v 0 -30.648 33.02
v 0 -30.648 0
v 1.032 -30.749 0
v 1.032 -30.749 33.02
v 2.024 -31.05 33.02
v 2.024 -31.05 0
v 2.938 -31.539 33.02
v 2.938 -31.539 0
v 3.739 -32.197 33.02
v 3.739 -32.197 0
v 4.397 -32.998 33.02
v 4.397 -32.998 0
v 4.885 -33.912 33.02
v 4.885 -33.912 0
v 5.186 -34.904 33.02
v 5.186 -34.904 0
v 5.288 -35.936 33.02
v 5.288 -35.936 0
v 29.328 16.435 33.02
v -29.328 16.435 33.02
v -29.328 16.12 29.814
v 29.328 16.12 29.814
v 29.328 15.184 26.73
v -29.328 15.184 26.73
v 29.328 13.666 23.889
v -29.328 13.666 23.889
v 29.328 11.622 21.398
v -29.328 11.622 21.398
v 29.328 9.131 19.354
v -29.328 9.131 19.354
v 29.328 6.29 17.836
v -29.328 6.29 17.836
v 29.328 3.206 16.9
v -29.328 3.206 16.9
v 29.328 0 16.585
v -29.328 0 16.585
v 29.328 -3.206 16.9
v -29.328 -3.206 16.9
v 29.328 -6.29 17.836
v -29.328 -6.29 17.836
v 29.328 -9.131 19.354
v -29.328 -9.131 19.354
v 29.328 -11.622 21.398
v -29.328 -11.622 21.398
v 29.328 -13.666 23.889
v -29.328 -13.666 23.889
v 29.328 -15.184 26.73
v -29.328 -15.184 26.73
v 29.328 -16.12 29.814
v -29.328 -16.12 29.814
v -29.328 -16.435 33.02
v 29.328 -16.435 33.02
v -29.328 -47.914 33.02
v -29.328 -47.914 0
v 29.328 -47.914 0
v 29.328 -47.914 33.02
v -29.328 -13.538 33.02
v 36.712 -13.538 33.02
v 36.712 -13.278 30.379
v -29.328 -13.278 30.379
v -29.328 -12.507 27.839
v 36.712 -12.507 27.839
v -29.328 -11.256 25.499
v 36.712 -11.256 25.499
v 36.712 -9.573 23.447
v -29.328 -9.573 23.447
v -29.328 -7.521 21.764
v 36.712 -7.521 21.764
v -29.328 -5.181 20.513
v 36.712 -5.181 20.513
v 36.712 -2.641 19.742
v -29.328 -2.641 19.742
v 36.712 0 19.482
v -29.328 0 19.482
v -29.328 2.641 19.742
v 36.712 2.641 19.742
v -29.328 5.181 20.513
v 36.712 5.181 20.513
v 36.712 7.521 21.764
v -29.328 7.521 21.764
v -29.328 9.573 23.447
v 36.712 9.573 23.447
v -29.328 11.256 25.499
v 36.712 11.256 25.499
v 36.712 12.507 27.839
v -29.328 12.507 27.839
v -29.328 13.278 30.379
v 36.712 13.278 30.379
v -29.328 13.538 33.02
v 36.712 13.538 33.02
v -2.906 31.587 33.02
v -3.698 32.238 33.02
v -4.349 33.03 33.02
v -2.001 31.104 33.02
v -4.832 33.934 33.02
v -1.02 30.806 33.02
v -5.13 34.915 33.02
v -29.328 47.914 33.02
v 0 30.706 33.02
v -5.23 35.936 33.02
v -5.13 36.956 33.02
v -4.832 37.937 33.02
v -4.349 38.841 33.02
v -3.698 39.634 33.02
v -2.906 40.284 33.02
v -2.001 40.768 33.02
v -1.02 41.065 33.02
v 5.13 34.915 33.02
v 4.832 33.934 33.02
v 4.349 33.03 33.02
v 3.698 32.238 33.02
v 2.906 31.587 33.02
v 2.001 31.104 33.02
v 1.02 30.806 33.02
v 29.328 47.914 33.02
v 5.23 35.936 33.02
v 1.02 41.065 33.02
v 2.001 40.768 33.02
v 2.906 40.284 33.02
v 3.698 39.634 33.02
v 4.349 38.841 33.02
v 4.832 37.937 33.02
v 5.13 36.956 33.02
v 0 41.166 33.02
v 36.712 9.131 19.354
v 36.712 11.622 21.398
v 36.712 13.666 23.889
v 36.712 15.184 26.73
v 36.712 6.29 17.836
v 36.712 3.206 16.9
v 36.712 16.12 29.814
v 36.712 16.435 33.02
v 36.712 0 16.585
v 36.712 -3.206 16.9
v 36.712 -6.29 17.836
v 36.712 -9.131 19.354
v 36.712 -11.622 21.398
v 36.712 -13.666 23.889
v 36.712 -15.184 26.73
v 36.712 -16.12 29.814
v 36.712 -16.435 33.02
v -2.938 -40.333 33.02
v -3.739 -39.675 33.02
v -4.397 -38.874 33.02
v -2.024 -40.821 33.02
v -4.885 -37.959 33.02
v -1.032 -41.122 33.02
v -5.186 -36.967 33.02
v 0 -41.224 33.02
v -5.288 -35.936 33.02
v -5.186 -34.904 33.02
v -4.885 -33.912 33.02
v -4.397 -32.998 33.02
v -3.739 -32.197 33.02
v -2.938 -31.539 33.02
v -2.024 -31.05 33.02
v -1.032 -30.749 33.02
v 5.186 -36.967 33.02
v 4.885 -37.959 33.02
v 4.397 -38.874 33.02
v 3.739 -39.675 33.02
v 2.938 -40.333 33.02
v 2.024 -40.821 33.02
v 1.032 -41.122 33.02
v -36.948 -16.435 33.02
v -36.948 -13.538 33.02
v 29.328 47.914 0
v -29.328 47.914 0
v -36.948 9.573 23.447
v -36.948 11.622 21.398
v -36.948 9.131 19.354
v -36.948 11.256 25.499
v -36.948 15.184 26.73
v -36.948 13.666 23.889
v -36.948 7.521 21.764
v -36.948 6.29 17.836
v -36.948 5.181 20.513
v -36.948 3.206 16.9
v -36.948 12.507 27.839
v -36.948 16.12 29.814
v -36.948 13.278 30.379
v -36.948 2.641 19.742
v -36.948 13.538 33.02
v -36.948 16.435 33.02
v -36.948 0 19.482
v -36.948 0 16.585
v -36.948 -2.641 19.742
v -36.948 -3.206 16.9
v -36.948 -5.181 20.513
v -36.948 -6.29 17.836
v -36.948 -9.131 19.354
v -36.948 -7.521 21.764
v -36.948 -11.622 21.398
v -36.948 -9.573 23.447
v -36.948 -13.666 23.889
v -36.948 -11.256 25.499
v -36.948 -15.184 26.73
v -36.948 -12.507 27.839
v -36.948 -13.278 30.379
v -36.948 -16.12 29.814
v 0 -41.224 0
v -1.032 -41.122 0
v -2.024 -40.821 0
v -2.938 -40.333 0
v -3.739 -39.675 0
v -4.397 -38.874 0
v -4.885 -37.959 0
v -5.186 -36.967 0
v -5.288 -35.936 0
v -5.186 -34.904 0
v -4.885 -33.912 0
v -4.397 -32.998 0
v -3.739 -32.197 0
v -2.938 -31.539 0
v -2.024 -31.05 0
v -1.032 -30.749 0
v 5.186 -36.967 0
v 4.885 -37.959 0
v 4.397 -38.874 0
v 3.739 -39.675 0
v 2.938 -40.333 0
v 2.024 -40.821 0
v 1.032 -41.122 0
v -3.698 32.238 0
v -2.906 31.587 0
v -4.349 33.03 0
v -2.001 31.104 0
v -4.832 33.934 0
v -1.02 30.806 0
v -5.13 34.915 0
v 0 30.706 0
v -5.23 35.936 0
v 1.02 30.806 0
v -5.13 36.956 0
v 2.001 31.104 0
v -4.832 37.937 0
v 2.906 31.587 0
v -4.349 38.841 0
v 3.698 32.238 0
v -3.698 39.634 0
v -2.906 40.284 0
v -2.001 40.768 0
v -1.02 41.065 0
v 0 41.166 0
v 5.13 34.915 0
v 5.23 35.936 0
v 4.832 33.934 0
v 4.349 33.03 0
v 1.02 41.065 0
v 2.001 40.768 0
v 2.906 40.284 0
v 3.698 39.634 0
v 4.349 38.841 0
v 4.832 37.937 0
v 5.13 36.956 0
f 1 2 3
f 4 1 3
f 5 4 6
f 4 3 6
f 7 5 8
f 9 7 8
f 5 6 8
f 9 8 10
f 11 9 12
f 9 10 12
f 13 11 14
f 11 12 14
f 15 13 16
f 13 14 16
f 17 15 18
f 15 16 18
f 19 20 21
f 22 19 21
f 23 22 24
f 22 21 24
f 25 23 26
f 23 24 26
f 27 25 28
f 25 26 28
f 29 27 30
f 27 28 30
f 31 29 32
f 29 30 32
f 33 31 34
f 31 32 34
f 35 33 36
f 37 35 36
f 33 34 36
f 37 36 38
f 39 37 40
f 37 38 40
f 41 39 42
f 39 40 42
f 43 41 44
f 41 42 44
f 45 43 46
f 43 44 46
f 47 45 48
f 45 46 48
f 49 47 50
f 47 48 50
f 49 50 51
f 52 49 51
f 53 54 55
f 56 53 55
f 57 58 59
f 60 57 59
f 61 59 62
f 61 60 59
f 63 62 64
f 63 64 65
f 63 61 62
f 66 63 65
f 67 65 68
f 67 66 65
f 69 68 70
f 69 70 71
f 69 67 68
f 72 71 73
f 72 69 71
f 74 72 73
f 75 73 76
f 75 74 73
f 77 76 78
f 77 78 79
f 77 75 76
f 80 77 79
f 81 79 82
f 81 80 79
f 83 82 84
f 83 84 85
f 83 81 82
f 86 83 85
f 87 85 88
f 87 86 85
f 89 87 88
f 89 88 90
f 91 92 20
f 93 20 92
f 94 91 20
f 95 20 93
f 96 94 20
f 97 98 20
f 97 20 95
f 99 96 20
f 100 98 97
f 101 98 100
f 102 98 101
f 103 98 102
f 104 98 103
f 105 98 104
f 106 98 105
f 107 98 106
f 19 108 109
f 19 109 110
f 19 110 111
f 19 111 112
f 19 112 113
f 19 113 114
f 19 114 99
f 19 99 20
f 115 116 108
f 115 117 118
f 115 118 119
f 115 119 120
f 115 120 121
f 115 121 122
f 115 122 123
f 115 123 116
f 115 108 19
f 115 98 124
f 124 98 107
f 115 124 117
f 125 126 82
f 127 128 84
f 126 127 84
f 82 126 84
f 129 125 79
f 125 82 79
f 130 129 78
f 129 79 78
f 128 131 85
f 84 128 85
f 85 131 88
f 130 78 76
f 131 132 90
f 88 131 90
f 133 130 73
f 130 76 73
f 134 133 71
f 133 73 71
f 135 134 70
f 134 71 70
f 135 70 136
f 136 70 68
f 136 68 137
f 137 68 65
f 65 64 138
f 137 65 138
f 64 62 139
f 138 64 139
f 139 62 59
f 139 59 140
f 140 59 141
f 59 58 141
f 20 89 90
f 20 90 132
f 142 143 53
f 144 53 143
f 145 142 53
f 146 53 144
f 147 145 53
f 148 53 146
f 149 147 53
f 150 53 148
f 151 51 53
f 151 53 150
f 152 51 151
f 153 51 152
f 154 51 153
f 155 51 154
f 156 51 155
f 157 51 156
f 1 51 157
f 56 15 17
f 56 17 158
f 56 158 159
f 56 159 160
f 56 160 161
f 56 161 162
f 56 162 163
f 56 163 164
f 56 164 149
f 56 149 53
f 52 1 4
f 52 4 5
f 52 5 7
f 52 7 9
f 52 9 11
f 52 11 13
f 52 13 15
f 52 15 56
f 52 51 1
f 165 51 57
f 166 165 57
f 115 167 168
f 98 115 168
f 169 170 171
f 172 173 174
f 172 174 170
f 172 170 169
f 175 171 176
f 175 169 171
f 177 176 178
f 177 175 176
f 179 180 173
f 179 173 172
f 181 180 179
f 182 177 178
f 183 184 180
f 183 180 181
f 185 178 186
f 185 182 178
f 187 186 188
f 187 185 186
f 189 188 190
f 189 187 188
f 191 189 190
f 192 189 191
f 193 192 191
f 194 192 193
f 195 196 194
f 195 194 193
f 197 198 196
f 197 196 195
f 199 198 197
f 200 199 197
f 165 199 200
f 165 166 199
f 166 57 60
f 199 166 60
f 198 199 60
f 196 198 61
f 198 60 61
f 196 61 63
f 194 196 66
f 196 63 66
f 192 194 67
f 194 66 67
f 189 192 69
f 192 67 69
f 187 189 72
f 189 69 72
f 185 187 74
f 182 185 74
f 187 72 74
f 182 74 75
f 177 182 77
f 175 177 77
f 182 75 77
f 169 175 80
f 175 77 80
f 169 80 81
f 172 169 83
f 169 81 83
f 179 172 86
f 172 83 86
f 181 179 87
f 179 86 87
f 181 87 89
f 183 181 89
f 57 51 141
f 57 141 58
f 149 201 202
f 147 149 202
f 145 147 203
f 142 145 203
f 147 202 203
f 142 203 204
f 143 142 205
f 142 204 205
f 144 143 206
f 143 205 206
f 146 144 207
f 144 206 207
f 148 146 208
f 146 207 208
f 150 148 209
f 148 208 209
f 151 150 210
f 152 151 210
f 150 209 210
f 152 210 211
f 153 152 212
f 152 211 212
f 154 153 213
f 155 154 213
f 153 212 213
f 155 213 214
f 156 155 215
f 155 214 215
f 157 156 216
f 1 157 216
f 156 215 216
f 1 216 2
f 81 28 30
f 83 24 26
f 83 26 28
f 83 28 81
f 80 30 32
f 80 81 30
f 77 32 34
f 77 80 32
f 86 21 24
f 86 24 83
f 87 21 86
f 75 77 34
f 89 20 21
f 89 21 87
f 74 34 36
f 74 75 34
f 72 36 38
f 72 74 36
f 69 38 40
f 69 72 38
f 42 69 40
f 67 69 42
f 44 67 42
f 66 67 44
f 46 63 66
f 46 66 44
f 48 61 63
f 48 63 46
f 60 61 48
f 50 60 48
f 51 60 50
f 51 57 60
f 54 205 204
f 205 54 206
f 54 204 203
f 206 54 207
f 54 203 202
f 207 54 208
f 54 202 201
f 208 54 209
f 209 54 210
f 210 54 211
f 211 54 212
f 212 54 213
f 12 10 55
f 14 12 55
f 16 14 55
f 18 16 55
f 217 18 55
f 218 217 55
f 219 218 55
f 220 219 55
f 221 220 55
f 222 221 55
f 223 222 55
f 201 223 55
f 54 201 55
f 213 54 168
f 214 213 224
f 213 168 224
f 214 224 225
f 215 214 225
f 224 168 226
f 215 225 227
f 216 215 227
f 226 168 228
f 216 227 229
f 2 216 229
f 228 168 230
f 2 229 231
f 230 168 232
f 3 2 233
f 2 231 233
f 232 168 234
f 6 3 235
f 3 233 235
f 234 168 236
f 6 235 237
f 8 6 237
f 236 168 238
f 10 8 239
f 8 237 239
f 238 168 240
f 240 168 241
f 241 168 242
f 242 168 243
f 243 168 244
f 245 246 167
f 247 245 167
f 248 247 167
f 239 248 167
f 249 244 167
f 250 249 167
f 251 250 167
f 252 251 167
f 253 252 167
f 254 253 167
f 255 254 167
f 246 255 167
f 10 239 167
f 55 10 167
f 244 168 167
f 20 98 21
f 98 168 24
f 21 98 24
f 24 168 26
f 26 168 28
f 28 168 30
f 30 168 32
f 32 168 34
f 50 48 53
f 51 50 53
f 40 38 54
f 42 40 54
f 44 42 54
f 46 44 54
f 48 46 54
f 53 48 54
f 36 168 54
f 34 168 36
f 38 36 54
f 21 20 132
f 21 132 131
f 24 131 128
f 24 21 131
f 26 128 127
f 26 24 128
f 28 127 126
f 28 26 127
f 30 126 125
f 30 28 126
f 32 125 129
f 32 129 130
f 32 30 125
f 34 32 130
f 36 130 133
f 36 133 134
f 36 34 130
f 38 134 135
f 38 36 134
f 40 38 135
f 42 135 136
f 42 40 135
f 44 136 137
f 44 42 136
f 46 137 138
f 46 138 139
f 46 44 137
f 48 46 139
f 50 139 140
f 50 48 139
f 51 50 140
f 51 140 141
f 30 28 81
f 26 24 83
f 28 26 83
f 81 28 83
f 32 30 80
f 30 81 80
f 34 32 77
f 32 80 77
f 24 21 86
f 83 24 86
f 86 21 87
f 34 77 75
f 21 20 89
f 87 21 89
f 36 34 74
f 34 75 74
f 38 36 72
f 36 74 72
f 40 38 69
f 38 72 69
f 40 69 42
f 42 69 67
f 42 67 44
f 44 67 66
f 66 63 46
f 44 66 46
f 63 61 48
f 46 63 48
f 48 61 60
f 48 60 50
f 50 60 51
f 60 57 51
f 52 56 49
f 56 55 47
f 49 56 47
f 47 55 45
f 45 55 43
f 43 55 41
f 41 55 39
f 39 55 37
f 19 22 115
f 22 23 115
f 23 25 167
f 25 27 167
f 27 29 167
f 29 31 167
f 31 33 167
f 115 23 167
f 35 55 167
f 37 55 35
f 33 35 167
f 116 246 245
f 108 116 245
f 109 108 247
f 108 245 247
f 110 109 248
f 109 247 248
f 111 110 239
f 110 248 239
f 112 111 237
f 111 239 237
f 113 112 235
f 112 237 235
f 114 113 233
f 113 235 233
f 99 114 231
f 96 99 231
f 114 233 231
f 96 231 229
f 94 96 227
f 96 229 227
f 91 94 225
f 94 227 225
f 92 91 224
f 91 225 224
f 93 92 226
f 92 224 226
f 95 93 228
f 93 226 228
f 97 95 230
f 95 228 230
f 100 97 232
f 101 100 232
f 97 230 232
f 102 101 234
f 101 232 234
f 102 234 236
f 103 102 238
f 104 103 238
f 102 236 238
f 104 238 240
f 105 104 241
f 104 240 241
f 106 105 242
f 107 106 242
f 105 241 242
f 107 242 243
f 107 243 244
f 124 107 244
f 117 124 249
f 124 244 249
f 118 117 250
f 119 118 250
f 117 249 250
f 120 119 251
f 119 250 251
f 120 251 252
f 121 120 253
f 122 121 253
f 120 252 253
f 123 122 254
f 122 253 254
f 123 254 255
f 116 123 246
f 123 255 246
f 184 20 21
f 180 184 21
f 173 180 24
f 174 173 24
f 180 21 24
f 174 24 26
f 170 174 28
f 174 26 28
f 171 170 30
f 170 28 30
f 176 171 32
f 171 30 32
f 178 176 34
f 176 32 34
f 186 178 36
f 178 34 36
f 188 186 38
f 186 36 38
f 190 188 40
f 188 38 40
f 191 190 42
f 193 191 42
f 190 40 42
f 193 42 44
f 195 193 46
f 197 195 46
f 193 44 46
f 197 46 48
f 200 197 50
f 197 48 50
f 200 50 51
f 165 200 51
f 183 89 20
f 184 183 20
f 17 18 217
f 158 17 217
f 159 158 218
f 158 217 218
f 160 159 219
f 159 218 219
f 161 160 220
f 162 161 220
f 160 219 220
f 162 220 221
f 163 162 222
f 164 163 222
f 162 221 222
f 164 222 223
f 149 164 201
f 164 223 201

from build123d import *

# Parameters (mm, degrees)
F1_DEPTH = 33.02
F3_DEPTH = 76.2
F4_DEPTH = 7.62
F5_DEPTH = 66.04


with BuildPart() as f1:
    # F0 (on Top) → F1 (new body)
    with BuildSketch(Plane.XY):
        with BuildLine():
            Line((0, -47.9143559933), (29.3275189122, -47.9143559933))
            Line((29.3275189122, -47.9143559933), (29.3275189122, 0))
            Line((29.3275189122, 0), (0, 0))
            Line((0, 0), (0, -23.9571779966))
            Line((0, -23.9571779966), (0, -30.6478155525))
            ThreePointArc((0, -30.6478155525), (3.7391463235, -32.1966206714), (5.2879514424, -35.935766995))
            ThreePointArc((5.2879514424, -35.935766995), (3.7391463235, -39.6749133185), (0, -41.2237184374))
            Line((0, -41.2237184374), (0, -47.9143559933))
        make_face()
        with BuildLine():
            Line((-29.3275189122, -47.9143559933), (0, -47.9143559933))
            Line((0, -47.9143559933), (0, -41.2237184374))
            ThreePointArc((0, -41.2237184374), (-5.2879514424, -35.935766995), (0, -30.6478155525))
            Line((0, -30.6478155525), (0, -23.9571779966))
            Line((0, -23.9571779966), (0, 0))
            Line((0, 0), (-29.3275189122, 0))
            Line((-29.3275189122, 0), (-29.3275189122, -47.9143559933))
        make_face()
        with BuildLine():
            Line((0, 0), (29.3275189122, 0))
            Line((29.3275189122, 0), (29.3275189122, 47.9143559933))
            Line((29.3275189122, 47.9143559933), (0, 47.9143559933))
            Line((0, 47.9143559933), (0, 41.165858772))
            ThreePointArc((0, 41.165858772), (3.6982333618, 39.6340003567), (5.2300917771, 35.935766995))
            ThreePointArc((5.2300917771, 35.935766995), (3.6982333618, 32.2375336332), (0, 30.7056752179))
            Line((0, 30.7056752179), (0, 23.9571779966))
            Line((0, 23.9571779966), (0, 0))
        make_face()
        with BuildLine():
            Line((-29.3275189122, 0), (0, 0))
            Line((0, 0), (0, 23.9571779966))
            Line((0, 23.9571779966), (0, 30.7056752179))
            ThreePointArc((0, 30.7056752179), (-5.2300917771, 35.935766995), (0, 41.165858772))
            Line((0, 41.165858772), (0, 47.9143559933))
            Line((0, 47.9143559933), (-29.3275189122, 47.9143559933))
            Line((-29.3275189122, 47.9143559933), (-29.3275189122, 0))
        make_face()
    extrude(amount=F1_DEPTH)

    # F2 (on face) → F3 (cut)
    with BuildSketch(Plane(origin=(-29.3275189122, 0, 0), x_dir=(0, -1, 0), z_dir=(-1, 0, 0))):
        with BuildLine():
            ThreePointArc((-16.4354129584, 33.02), (0, 16.5845870416), (16.4354129584, 33.02))
            Line((16.4354129584, 33.02), (13.5376890678, 33.02))
            ThreePointArc((13.5376890678, 33.02), (0, 19.4823109322), (-13.5376890678, 33.02))
            Line((-13.5376890678, 33.02), (-16.4354129584, 33.02))
        make_face()
        with BuildLine():
            ThreePointArc((-13.5376890678, 33.02), (0, 19.4823109322), (13.5376890678, 33.02))
            Line((13.5376890678, 33.02), (-13.5376890678, 33.02))
        make_face()
    extrude(amount=-F3_DEPTH, mode=Mode.SUBTRACT)


with BuildPart() as f4:
    # F2 (on face) → F4 (new body)
    with BuildSketch(Plane(origin=(-29.3275189122, 0, 0), x_dir=(0, -1, 0), z_dir=(-1, 0, 0))):
        with BuildLine():
            ThreePointArc((-16.4354129584, 33.02), (0, 16.5845870416), (16.4354129584, 33.02))
            Line((16.4354129584, 33.02), (13.5376890678, 33.02))
            ThreePointArc((13.5376890678, 33.02), (0, 19.4823109322), (-13.5376890678, 33.02))
            Line((-13.5376890678, 33.02), (-16.4354129584, 33.02))
        make_face()
    extrude(amount=F4_DEPTH)


with BuildPart() as f5:
    # F2 (on face) → F5 (new body)
    with BuildSketch(Plane(origin=(-29.3275189122, 0, 0), x_dir=(0, -1, 0), z_dir=(-1, 0, 0))):
        with BuildLine():
            ThreePointArc((-16.4354129584, 33.02), (0, 16.5845870416), (16.4354129584, 33.02))
            Line((16.4354129584, 33.02), (13.5376890678, 33.02))
            ThreePointArc((13.5376890678, 33.02), (0, 19.4823109322), (-13.5376890678, 33.02))
            Line((-13.5376890678, 33.02), (-16.4354129584, 33.02))
        make_face()
    extrude(amount=-F5_DEPTH)


solid = Compound([f1.part, f4.part, f5.part])
